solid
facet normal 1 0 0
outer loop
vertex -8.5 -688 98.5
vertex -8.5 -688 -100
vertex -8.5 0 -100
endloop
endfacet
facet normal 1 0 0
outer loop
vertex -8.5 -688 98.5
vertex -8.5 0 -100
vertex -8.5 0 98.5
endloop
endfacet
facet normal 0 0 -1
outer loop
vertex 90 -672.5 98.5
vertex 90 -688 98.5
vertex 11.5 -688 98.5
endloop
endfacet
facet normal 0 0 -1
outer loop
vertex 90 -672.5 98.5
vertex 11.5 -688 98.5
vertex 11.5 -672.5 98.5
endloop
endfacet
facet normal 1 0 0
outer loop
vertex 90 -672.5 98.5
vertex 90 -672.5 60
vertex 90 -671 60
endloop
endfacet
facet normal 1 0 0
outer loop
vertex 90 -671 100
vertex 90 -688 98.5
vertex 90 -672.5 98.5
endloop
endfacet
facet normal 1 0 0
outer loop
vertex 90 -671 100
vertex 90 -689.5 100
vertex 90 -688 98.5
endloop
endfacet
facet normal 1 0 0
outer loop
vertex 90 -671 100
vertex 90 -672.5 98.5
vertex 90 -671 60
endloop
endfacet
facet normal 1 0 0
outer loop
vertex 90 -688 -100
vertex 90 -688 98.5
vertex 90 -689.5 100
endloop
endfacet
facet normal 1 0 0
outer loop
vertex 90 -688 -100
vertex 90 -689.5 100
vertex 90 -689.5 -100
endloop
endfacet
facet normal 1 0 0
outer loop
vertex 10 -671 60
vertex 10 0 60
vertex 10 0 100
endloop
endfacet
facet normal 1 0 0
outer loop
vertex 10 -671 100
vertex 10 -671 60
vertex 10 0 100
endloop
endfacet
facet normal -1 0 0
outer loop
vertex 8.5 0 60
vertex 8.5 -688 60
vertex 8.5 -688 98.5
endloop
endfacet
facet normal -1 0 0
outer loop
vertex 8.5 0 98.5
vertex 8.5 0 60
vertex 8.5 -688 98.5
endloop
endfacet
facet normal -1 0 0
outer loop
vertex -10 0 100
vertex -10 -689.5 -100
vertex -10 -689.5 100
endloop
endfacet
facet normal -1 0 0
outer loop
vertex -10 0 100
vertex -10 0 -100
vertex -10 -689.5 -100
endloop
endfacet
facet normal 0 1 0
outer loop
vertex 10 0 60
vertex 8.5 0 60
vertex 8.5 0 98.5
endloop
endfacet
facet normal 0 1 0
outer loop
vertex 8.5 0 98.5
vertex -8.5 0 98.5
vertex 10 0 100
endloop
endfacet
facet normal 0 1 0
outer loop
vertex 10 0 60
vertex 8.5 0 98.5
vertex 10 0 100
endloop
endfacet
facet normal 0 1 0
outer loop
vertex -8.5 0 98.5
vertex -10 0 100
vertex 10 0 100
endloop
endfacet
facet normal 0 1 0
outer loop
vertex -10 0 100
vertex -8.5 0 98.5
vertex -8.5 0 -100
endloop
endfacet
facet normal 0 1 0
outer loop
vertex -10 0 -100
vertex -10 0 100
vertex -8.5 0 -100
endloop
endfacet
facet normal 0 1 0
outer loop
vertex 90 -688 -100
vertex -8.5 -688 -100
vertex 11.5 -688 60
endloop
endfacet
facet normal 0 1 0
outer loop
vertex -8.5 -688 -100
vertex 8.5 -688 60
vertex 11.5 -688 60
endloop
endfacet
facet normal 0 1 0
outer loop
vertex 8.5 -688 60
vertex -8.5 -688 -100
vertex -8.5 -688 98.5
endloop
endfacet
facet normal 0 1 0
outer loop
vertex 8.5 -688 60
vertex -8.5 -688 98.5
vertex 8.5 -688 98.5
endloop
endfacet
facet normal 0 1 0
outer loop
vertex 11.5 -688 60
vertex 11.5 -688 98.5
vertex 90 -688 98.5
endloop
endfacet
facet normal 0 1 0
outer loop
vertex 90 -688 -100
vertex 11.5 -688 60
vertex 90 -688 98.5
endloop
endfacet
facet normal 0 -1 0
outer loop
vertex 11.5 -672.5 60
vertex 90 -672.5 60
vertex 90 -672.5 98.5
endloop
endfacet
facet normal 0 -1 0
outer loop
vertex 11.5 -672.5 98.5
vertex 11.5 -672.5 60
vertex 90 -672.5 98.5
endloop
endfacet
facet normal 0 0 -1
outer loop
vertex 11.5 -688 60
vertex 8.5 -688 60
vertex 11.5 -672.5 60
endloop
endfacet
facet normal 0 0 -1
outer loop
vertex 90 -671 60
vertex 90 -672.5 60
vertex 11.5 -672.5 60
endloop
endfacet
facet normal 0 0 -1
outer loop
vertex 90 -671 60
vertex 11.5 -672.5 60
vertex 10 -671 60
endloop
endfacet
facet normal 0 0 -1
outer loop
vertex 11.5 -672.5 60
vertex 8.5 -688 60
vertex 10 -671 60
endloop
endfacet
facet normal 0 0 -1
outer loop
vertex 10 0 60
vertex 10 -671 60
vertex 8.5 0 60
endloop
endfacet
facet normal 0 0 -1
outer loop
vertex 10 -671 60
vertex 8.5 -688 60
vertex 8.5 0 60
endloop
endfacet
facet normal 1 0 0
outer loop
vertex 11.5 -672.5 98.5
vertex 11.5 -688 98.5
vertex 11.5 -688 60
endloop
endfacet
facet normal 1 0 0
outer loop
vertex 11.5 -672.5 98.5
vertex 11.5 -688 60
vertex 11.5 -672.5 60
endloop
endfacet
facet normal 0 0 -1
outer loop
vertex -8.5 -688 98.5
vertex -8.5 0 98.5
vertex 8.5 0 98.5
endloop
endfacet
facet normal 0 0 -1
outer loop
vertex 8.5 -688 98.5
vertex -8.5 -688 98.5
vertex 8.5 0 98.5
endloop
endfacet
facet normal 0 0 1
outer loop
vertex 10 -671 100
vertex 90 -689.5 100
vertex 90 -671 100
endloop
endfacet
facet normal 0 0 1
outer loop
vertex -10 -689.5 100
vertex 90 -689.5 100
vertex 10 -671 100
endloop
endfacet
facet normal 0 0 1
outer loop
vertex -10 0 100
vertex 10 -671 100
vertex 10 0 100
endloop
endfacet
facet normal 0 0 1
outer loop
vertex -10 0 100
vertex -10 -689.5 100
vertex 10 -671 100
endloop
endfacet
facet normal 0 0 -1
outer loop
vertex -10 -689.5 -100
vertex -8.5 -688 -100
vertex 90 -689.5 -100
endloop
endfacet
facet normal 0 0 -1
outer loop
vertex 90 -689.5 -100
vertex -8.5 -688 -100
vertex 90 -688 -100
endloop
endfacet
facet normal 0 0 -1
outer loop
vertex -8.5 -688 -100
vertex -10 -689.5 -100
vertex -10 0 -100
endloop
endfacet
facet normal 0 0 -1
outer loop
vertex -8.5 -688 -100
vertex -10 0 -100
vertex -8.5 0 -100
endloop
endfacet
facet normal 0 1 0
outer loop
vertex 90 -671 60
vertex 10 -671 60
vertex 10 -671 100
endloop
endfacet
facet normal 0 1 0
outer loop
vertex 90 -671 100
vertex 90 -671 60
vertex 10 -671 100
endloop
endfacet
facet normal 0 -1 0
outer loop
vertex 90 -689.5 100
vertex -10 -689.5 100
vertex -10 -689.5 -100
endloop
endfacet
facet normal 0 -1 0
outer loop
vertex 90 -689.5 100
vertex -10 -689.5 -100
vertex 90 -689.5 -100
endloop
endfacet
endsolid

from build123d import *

# Parameters (mm, degrees)
F0_W      = 20
F0_H      = 200
F1_DEPTH  = 688
F2_W      = 18.5
F2_H      = 160
F3_DEPTH  = 688
F4_W      = 17
F4_H      = 38.5
F5_DEPTH  = 688
F6_W      = 100
F6_H      = 200
F7_DEPTH  = 1.5
F8_W      = 17
F8_H      = 40
F9_DEPTH  = 80
F10_W     = 15.5
F10_H     = 38.5
F11_DEPTH = 78.5


with BuildPart() as f1:
    # F0 (on Front) → F1 (new body)
    with BuildSketch(Plane.XZ):
        Rectangle(F0_W, F0_H)
    extrude(amount=F1_DEPTH)

    # F2 (on face) → F3 (cut)
    with BuildSketch(Plane.XZ.offset(688)):
        with Locations((0.75, -20)):
            Rectangle(F2_W, F2_H)
    extrude(amount=-F3_DEPTH, mode=Mode.SUBTRACT)

    # F4 (on face) → F5 (cut)
    with BuildSketch(Plane.XZ.offset(688)):
        with Locations((0, 79.25)):
            Rectangle(F4_W, F4_H)
    extrude(amount=-F5_DEPTH, mode=Mode.SUBTRACT)

    # F6 (on face) → F7 (join)
    with BuildSketch(Plane.XZ.offset(688)):
        with Locations((40, 0)):
            Rectangle(F6_W, F6_H)
    extrude(amount=F7_DEPTH)

    # F8 (on face) → F9 (join)
    with BuildSketch(Plane.YZ.offset(10)):
        with Locations((-679.5, 80)):
            Rectangle(F8_W, F8_H)
    extrude(amount=F9_DEPTH)

    # F10 (on face) → F11 (cut)
    with BuildSketch(Plane.YZ.offset(90)):
        with Locations((-680.25, 79.25)):
            Rectangle(F10_W, F10_H)
    extrude(amount=-F11_DEPTH, mode=Mode.SUBTRACT)


solid = f1.part
